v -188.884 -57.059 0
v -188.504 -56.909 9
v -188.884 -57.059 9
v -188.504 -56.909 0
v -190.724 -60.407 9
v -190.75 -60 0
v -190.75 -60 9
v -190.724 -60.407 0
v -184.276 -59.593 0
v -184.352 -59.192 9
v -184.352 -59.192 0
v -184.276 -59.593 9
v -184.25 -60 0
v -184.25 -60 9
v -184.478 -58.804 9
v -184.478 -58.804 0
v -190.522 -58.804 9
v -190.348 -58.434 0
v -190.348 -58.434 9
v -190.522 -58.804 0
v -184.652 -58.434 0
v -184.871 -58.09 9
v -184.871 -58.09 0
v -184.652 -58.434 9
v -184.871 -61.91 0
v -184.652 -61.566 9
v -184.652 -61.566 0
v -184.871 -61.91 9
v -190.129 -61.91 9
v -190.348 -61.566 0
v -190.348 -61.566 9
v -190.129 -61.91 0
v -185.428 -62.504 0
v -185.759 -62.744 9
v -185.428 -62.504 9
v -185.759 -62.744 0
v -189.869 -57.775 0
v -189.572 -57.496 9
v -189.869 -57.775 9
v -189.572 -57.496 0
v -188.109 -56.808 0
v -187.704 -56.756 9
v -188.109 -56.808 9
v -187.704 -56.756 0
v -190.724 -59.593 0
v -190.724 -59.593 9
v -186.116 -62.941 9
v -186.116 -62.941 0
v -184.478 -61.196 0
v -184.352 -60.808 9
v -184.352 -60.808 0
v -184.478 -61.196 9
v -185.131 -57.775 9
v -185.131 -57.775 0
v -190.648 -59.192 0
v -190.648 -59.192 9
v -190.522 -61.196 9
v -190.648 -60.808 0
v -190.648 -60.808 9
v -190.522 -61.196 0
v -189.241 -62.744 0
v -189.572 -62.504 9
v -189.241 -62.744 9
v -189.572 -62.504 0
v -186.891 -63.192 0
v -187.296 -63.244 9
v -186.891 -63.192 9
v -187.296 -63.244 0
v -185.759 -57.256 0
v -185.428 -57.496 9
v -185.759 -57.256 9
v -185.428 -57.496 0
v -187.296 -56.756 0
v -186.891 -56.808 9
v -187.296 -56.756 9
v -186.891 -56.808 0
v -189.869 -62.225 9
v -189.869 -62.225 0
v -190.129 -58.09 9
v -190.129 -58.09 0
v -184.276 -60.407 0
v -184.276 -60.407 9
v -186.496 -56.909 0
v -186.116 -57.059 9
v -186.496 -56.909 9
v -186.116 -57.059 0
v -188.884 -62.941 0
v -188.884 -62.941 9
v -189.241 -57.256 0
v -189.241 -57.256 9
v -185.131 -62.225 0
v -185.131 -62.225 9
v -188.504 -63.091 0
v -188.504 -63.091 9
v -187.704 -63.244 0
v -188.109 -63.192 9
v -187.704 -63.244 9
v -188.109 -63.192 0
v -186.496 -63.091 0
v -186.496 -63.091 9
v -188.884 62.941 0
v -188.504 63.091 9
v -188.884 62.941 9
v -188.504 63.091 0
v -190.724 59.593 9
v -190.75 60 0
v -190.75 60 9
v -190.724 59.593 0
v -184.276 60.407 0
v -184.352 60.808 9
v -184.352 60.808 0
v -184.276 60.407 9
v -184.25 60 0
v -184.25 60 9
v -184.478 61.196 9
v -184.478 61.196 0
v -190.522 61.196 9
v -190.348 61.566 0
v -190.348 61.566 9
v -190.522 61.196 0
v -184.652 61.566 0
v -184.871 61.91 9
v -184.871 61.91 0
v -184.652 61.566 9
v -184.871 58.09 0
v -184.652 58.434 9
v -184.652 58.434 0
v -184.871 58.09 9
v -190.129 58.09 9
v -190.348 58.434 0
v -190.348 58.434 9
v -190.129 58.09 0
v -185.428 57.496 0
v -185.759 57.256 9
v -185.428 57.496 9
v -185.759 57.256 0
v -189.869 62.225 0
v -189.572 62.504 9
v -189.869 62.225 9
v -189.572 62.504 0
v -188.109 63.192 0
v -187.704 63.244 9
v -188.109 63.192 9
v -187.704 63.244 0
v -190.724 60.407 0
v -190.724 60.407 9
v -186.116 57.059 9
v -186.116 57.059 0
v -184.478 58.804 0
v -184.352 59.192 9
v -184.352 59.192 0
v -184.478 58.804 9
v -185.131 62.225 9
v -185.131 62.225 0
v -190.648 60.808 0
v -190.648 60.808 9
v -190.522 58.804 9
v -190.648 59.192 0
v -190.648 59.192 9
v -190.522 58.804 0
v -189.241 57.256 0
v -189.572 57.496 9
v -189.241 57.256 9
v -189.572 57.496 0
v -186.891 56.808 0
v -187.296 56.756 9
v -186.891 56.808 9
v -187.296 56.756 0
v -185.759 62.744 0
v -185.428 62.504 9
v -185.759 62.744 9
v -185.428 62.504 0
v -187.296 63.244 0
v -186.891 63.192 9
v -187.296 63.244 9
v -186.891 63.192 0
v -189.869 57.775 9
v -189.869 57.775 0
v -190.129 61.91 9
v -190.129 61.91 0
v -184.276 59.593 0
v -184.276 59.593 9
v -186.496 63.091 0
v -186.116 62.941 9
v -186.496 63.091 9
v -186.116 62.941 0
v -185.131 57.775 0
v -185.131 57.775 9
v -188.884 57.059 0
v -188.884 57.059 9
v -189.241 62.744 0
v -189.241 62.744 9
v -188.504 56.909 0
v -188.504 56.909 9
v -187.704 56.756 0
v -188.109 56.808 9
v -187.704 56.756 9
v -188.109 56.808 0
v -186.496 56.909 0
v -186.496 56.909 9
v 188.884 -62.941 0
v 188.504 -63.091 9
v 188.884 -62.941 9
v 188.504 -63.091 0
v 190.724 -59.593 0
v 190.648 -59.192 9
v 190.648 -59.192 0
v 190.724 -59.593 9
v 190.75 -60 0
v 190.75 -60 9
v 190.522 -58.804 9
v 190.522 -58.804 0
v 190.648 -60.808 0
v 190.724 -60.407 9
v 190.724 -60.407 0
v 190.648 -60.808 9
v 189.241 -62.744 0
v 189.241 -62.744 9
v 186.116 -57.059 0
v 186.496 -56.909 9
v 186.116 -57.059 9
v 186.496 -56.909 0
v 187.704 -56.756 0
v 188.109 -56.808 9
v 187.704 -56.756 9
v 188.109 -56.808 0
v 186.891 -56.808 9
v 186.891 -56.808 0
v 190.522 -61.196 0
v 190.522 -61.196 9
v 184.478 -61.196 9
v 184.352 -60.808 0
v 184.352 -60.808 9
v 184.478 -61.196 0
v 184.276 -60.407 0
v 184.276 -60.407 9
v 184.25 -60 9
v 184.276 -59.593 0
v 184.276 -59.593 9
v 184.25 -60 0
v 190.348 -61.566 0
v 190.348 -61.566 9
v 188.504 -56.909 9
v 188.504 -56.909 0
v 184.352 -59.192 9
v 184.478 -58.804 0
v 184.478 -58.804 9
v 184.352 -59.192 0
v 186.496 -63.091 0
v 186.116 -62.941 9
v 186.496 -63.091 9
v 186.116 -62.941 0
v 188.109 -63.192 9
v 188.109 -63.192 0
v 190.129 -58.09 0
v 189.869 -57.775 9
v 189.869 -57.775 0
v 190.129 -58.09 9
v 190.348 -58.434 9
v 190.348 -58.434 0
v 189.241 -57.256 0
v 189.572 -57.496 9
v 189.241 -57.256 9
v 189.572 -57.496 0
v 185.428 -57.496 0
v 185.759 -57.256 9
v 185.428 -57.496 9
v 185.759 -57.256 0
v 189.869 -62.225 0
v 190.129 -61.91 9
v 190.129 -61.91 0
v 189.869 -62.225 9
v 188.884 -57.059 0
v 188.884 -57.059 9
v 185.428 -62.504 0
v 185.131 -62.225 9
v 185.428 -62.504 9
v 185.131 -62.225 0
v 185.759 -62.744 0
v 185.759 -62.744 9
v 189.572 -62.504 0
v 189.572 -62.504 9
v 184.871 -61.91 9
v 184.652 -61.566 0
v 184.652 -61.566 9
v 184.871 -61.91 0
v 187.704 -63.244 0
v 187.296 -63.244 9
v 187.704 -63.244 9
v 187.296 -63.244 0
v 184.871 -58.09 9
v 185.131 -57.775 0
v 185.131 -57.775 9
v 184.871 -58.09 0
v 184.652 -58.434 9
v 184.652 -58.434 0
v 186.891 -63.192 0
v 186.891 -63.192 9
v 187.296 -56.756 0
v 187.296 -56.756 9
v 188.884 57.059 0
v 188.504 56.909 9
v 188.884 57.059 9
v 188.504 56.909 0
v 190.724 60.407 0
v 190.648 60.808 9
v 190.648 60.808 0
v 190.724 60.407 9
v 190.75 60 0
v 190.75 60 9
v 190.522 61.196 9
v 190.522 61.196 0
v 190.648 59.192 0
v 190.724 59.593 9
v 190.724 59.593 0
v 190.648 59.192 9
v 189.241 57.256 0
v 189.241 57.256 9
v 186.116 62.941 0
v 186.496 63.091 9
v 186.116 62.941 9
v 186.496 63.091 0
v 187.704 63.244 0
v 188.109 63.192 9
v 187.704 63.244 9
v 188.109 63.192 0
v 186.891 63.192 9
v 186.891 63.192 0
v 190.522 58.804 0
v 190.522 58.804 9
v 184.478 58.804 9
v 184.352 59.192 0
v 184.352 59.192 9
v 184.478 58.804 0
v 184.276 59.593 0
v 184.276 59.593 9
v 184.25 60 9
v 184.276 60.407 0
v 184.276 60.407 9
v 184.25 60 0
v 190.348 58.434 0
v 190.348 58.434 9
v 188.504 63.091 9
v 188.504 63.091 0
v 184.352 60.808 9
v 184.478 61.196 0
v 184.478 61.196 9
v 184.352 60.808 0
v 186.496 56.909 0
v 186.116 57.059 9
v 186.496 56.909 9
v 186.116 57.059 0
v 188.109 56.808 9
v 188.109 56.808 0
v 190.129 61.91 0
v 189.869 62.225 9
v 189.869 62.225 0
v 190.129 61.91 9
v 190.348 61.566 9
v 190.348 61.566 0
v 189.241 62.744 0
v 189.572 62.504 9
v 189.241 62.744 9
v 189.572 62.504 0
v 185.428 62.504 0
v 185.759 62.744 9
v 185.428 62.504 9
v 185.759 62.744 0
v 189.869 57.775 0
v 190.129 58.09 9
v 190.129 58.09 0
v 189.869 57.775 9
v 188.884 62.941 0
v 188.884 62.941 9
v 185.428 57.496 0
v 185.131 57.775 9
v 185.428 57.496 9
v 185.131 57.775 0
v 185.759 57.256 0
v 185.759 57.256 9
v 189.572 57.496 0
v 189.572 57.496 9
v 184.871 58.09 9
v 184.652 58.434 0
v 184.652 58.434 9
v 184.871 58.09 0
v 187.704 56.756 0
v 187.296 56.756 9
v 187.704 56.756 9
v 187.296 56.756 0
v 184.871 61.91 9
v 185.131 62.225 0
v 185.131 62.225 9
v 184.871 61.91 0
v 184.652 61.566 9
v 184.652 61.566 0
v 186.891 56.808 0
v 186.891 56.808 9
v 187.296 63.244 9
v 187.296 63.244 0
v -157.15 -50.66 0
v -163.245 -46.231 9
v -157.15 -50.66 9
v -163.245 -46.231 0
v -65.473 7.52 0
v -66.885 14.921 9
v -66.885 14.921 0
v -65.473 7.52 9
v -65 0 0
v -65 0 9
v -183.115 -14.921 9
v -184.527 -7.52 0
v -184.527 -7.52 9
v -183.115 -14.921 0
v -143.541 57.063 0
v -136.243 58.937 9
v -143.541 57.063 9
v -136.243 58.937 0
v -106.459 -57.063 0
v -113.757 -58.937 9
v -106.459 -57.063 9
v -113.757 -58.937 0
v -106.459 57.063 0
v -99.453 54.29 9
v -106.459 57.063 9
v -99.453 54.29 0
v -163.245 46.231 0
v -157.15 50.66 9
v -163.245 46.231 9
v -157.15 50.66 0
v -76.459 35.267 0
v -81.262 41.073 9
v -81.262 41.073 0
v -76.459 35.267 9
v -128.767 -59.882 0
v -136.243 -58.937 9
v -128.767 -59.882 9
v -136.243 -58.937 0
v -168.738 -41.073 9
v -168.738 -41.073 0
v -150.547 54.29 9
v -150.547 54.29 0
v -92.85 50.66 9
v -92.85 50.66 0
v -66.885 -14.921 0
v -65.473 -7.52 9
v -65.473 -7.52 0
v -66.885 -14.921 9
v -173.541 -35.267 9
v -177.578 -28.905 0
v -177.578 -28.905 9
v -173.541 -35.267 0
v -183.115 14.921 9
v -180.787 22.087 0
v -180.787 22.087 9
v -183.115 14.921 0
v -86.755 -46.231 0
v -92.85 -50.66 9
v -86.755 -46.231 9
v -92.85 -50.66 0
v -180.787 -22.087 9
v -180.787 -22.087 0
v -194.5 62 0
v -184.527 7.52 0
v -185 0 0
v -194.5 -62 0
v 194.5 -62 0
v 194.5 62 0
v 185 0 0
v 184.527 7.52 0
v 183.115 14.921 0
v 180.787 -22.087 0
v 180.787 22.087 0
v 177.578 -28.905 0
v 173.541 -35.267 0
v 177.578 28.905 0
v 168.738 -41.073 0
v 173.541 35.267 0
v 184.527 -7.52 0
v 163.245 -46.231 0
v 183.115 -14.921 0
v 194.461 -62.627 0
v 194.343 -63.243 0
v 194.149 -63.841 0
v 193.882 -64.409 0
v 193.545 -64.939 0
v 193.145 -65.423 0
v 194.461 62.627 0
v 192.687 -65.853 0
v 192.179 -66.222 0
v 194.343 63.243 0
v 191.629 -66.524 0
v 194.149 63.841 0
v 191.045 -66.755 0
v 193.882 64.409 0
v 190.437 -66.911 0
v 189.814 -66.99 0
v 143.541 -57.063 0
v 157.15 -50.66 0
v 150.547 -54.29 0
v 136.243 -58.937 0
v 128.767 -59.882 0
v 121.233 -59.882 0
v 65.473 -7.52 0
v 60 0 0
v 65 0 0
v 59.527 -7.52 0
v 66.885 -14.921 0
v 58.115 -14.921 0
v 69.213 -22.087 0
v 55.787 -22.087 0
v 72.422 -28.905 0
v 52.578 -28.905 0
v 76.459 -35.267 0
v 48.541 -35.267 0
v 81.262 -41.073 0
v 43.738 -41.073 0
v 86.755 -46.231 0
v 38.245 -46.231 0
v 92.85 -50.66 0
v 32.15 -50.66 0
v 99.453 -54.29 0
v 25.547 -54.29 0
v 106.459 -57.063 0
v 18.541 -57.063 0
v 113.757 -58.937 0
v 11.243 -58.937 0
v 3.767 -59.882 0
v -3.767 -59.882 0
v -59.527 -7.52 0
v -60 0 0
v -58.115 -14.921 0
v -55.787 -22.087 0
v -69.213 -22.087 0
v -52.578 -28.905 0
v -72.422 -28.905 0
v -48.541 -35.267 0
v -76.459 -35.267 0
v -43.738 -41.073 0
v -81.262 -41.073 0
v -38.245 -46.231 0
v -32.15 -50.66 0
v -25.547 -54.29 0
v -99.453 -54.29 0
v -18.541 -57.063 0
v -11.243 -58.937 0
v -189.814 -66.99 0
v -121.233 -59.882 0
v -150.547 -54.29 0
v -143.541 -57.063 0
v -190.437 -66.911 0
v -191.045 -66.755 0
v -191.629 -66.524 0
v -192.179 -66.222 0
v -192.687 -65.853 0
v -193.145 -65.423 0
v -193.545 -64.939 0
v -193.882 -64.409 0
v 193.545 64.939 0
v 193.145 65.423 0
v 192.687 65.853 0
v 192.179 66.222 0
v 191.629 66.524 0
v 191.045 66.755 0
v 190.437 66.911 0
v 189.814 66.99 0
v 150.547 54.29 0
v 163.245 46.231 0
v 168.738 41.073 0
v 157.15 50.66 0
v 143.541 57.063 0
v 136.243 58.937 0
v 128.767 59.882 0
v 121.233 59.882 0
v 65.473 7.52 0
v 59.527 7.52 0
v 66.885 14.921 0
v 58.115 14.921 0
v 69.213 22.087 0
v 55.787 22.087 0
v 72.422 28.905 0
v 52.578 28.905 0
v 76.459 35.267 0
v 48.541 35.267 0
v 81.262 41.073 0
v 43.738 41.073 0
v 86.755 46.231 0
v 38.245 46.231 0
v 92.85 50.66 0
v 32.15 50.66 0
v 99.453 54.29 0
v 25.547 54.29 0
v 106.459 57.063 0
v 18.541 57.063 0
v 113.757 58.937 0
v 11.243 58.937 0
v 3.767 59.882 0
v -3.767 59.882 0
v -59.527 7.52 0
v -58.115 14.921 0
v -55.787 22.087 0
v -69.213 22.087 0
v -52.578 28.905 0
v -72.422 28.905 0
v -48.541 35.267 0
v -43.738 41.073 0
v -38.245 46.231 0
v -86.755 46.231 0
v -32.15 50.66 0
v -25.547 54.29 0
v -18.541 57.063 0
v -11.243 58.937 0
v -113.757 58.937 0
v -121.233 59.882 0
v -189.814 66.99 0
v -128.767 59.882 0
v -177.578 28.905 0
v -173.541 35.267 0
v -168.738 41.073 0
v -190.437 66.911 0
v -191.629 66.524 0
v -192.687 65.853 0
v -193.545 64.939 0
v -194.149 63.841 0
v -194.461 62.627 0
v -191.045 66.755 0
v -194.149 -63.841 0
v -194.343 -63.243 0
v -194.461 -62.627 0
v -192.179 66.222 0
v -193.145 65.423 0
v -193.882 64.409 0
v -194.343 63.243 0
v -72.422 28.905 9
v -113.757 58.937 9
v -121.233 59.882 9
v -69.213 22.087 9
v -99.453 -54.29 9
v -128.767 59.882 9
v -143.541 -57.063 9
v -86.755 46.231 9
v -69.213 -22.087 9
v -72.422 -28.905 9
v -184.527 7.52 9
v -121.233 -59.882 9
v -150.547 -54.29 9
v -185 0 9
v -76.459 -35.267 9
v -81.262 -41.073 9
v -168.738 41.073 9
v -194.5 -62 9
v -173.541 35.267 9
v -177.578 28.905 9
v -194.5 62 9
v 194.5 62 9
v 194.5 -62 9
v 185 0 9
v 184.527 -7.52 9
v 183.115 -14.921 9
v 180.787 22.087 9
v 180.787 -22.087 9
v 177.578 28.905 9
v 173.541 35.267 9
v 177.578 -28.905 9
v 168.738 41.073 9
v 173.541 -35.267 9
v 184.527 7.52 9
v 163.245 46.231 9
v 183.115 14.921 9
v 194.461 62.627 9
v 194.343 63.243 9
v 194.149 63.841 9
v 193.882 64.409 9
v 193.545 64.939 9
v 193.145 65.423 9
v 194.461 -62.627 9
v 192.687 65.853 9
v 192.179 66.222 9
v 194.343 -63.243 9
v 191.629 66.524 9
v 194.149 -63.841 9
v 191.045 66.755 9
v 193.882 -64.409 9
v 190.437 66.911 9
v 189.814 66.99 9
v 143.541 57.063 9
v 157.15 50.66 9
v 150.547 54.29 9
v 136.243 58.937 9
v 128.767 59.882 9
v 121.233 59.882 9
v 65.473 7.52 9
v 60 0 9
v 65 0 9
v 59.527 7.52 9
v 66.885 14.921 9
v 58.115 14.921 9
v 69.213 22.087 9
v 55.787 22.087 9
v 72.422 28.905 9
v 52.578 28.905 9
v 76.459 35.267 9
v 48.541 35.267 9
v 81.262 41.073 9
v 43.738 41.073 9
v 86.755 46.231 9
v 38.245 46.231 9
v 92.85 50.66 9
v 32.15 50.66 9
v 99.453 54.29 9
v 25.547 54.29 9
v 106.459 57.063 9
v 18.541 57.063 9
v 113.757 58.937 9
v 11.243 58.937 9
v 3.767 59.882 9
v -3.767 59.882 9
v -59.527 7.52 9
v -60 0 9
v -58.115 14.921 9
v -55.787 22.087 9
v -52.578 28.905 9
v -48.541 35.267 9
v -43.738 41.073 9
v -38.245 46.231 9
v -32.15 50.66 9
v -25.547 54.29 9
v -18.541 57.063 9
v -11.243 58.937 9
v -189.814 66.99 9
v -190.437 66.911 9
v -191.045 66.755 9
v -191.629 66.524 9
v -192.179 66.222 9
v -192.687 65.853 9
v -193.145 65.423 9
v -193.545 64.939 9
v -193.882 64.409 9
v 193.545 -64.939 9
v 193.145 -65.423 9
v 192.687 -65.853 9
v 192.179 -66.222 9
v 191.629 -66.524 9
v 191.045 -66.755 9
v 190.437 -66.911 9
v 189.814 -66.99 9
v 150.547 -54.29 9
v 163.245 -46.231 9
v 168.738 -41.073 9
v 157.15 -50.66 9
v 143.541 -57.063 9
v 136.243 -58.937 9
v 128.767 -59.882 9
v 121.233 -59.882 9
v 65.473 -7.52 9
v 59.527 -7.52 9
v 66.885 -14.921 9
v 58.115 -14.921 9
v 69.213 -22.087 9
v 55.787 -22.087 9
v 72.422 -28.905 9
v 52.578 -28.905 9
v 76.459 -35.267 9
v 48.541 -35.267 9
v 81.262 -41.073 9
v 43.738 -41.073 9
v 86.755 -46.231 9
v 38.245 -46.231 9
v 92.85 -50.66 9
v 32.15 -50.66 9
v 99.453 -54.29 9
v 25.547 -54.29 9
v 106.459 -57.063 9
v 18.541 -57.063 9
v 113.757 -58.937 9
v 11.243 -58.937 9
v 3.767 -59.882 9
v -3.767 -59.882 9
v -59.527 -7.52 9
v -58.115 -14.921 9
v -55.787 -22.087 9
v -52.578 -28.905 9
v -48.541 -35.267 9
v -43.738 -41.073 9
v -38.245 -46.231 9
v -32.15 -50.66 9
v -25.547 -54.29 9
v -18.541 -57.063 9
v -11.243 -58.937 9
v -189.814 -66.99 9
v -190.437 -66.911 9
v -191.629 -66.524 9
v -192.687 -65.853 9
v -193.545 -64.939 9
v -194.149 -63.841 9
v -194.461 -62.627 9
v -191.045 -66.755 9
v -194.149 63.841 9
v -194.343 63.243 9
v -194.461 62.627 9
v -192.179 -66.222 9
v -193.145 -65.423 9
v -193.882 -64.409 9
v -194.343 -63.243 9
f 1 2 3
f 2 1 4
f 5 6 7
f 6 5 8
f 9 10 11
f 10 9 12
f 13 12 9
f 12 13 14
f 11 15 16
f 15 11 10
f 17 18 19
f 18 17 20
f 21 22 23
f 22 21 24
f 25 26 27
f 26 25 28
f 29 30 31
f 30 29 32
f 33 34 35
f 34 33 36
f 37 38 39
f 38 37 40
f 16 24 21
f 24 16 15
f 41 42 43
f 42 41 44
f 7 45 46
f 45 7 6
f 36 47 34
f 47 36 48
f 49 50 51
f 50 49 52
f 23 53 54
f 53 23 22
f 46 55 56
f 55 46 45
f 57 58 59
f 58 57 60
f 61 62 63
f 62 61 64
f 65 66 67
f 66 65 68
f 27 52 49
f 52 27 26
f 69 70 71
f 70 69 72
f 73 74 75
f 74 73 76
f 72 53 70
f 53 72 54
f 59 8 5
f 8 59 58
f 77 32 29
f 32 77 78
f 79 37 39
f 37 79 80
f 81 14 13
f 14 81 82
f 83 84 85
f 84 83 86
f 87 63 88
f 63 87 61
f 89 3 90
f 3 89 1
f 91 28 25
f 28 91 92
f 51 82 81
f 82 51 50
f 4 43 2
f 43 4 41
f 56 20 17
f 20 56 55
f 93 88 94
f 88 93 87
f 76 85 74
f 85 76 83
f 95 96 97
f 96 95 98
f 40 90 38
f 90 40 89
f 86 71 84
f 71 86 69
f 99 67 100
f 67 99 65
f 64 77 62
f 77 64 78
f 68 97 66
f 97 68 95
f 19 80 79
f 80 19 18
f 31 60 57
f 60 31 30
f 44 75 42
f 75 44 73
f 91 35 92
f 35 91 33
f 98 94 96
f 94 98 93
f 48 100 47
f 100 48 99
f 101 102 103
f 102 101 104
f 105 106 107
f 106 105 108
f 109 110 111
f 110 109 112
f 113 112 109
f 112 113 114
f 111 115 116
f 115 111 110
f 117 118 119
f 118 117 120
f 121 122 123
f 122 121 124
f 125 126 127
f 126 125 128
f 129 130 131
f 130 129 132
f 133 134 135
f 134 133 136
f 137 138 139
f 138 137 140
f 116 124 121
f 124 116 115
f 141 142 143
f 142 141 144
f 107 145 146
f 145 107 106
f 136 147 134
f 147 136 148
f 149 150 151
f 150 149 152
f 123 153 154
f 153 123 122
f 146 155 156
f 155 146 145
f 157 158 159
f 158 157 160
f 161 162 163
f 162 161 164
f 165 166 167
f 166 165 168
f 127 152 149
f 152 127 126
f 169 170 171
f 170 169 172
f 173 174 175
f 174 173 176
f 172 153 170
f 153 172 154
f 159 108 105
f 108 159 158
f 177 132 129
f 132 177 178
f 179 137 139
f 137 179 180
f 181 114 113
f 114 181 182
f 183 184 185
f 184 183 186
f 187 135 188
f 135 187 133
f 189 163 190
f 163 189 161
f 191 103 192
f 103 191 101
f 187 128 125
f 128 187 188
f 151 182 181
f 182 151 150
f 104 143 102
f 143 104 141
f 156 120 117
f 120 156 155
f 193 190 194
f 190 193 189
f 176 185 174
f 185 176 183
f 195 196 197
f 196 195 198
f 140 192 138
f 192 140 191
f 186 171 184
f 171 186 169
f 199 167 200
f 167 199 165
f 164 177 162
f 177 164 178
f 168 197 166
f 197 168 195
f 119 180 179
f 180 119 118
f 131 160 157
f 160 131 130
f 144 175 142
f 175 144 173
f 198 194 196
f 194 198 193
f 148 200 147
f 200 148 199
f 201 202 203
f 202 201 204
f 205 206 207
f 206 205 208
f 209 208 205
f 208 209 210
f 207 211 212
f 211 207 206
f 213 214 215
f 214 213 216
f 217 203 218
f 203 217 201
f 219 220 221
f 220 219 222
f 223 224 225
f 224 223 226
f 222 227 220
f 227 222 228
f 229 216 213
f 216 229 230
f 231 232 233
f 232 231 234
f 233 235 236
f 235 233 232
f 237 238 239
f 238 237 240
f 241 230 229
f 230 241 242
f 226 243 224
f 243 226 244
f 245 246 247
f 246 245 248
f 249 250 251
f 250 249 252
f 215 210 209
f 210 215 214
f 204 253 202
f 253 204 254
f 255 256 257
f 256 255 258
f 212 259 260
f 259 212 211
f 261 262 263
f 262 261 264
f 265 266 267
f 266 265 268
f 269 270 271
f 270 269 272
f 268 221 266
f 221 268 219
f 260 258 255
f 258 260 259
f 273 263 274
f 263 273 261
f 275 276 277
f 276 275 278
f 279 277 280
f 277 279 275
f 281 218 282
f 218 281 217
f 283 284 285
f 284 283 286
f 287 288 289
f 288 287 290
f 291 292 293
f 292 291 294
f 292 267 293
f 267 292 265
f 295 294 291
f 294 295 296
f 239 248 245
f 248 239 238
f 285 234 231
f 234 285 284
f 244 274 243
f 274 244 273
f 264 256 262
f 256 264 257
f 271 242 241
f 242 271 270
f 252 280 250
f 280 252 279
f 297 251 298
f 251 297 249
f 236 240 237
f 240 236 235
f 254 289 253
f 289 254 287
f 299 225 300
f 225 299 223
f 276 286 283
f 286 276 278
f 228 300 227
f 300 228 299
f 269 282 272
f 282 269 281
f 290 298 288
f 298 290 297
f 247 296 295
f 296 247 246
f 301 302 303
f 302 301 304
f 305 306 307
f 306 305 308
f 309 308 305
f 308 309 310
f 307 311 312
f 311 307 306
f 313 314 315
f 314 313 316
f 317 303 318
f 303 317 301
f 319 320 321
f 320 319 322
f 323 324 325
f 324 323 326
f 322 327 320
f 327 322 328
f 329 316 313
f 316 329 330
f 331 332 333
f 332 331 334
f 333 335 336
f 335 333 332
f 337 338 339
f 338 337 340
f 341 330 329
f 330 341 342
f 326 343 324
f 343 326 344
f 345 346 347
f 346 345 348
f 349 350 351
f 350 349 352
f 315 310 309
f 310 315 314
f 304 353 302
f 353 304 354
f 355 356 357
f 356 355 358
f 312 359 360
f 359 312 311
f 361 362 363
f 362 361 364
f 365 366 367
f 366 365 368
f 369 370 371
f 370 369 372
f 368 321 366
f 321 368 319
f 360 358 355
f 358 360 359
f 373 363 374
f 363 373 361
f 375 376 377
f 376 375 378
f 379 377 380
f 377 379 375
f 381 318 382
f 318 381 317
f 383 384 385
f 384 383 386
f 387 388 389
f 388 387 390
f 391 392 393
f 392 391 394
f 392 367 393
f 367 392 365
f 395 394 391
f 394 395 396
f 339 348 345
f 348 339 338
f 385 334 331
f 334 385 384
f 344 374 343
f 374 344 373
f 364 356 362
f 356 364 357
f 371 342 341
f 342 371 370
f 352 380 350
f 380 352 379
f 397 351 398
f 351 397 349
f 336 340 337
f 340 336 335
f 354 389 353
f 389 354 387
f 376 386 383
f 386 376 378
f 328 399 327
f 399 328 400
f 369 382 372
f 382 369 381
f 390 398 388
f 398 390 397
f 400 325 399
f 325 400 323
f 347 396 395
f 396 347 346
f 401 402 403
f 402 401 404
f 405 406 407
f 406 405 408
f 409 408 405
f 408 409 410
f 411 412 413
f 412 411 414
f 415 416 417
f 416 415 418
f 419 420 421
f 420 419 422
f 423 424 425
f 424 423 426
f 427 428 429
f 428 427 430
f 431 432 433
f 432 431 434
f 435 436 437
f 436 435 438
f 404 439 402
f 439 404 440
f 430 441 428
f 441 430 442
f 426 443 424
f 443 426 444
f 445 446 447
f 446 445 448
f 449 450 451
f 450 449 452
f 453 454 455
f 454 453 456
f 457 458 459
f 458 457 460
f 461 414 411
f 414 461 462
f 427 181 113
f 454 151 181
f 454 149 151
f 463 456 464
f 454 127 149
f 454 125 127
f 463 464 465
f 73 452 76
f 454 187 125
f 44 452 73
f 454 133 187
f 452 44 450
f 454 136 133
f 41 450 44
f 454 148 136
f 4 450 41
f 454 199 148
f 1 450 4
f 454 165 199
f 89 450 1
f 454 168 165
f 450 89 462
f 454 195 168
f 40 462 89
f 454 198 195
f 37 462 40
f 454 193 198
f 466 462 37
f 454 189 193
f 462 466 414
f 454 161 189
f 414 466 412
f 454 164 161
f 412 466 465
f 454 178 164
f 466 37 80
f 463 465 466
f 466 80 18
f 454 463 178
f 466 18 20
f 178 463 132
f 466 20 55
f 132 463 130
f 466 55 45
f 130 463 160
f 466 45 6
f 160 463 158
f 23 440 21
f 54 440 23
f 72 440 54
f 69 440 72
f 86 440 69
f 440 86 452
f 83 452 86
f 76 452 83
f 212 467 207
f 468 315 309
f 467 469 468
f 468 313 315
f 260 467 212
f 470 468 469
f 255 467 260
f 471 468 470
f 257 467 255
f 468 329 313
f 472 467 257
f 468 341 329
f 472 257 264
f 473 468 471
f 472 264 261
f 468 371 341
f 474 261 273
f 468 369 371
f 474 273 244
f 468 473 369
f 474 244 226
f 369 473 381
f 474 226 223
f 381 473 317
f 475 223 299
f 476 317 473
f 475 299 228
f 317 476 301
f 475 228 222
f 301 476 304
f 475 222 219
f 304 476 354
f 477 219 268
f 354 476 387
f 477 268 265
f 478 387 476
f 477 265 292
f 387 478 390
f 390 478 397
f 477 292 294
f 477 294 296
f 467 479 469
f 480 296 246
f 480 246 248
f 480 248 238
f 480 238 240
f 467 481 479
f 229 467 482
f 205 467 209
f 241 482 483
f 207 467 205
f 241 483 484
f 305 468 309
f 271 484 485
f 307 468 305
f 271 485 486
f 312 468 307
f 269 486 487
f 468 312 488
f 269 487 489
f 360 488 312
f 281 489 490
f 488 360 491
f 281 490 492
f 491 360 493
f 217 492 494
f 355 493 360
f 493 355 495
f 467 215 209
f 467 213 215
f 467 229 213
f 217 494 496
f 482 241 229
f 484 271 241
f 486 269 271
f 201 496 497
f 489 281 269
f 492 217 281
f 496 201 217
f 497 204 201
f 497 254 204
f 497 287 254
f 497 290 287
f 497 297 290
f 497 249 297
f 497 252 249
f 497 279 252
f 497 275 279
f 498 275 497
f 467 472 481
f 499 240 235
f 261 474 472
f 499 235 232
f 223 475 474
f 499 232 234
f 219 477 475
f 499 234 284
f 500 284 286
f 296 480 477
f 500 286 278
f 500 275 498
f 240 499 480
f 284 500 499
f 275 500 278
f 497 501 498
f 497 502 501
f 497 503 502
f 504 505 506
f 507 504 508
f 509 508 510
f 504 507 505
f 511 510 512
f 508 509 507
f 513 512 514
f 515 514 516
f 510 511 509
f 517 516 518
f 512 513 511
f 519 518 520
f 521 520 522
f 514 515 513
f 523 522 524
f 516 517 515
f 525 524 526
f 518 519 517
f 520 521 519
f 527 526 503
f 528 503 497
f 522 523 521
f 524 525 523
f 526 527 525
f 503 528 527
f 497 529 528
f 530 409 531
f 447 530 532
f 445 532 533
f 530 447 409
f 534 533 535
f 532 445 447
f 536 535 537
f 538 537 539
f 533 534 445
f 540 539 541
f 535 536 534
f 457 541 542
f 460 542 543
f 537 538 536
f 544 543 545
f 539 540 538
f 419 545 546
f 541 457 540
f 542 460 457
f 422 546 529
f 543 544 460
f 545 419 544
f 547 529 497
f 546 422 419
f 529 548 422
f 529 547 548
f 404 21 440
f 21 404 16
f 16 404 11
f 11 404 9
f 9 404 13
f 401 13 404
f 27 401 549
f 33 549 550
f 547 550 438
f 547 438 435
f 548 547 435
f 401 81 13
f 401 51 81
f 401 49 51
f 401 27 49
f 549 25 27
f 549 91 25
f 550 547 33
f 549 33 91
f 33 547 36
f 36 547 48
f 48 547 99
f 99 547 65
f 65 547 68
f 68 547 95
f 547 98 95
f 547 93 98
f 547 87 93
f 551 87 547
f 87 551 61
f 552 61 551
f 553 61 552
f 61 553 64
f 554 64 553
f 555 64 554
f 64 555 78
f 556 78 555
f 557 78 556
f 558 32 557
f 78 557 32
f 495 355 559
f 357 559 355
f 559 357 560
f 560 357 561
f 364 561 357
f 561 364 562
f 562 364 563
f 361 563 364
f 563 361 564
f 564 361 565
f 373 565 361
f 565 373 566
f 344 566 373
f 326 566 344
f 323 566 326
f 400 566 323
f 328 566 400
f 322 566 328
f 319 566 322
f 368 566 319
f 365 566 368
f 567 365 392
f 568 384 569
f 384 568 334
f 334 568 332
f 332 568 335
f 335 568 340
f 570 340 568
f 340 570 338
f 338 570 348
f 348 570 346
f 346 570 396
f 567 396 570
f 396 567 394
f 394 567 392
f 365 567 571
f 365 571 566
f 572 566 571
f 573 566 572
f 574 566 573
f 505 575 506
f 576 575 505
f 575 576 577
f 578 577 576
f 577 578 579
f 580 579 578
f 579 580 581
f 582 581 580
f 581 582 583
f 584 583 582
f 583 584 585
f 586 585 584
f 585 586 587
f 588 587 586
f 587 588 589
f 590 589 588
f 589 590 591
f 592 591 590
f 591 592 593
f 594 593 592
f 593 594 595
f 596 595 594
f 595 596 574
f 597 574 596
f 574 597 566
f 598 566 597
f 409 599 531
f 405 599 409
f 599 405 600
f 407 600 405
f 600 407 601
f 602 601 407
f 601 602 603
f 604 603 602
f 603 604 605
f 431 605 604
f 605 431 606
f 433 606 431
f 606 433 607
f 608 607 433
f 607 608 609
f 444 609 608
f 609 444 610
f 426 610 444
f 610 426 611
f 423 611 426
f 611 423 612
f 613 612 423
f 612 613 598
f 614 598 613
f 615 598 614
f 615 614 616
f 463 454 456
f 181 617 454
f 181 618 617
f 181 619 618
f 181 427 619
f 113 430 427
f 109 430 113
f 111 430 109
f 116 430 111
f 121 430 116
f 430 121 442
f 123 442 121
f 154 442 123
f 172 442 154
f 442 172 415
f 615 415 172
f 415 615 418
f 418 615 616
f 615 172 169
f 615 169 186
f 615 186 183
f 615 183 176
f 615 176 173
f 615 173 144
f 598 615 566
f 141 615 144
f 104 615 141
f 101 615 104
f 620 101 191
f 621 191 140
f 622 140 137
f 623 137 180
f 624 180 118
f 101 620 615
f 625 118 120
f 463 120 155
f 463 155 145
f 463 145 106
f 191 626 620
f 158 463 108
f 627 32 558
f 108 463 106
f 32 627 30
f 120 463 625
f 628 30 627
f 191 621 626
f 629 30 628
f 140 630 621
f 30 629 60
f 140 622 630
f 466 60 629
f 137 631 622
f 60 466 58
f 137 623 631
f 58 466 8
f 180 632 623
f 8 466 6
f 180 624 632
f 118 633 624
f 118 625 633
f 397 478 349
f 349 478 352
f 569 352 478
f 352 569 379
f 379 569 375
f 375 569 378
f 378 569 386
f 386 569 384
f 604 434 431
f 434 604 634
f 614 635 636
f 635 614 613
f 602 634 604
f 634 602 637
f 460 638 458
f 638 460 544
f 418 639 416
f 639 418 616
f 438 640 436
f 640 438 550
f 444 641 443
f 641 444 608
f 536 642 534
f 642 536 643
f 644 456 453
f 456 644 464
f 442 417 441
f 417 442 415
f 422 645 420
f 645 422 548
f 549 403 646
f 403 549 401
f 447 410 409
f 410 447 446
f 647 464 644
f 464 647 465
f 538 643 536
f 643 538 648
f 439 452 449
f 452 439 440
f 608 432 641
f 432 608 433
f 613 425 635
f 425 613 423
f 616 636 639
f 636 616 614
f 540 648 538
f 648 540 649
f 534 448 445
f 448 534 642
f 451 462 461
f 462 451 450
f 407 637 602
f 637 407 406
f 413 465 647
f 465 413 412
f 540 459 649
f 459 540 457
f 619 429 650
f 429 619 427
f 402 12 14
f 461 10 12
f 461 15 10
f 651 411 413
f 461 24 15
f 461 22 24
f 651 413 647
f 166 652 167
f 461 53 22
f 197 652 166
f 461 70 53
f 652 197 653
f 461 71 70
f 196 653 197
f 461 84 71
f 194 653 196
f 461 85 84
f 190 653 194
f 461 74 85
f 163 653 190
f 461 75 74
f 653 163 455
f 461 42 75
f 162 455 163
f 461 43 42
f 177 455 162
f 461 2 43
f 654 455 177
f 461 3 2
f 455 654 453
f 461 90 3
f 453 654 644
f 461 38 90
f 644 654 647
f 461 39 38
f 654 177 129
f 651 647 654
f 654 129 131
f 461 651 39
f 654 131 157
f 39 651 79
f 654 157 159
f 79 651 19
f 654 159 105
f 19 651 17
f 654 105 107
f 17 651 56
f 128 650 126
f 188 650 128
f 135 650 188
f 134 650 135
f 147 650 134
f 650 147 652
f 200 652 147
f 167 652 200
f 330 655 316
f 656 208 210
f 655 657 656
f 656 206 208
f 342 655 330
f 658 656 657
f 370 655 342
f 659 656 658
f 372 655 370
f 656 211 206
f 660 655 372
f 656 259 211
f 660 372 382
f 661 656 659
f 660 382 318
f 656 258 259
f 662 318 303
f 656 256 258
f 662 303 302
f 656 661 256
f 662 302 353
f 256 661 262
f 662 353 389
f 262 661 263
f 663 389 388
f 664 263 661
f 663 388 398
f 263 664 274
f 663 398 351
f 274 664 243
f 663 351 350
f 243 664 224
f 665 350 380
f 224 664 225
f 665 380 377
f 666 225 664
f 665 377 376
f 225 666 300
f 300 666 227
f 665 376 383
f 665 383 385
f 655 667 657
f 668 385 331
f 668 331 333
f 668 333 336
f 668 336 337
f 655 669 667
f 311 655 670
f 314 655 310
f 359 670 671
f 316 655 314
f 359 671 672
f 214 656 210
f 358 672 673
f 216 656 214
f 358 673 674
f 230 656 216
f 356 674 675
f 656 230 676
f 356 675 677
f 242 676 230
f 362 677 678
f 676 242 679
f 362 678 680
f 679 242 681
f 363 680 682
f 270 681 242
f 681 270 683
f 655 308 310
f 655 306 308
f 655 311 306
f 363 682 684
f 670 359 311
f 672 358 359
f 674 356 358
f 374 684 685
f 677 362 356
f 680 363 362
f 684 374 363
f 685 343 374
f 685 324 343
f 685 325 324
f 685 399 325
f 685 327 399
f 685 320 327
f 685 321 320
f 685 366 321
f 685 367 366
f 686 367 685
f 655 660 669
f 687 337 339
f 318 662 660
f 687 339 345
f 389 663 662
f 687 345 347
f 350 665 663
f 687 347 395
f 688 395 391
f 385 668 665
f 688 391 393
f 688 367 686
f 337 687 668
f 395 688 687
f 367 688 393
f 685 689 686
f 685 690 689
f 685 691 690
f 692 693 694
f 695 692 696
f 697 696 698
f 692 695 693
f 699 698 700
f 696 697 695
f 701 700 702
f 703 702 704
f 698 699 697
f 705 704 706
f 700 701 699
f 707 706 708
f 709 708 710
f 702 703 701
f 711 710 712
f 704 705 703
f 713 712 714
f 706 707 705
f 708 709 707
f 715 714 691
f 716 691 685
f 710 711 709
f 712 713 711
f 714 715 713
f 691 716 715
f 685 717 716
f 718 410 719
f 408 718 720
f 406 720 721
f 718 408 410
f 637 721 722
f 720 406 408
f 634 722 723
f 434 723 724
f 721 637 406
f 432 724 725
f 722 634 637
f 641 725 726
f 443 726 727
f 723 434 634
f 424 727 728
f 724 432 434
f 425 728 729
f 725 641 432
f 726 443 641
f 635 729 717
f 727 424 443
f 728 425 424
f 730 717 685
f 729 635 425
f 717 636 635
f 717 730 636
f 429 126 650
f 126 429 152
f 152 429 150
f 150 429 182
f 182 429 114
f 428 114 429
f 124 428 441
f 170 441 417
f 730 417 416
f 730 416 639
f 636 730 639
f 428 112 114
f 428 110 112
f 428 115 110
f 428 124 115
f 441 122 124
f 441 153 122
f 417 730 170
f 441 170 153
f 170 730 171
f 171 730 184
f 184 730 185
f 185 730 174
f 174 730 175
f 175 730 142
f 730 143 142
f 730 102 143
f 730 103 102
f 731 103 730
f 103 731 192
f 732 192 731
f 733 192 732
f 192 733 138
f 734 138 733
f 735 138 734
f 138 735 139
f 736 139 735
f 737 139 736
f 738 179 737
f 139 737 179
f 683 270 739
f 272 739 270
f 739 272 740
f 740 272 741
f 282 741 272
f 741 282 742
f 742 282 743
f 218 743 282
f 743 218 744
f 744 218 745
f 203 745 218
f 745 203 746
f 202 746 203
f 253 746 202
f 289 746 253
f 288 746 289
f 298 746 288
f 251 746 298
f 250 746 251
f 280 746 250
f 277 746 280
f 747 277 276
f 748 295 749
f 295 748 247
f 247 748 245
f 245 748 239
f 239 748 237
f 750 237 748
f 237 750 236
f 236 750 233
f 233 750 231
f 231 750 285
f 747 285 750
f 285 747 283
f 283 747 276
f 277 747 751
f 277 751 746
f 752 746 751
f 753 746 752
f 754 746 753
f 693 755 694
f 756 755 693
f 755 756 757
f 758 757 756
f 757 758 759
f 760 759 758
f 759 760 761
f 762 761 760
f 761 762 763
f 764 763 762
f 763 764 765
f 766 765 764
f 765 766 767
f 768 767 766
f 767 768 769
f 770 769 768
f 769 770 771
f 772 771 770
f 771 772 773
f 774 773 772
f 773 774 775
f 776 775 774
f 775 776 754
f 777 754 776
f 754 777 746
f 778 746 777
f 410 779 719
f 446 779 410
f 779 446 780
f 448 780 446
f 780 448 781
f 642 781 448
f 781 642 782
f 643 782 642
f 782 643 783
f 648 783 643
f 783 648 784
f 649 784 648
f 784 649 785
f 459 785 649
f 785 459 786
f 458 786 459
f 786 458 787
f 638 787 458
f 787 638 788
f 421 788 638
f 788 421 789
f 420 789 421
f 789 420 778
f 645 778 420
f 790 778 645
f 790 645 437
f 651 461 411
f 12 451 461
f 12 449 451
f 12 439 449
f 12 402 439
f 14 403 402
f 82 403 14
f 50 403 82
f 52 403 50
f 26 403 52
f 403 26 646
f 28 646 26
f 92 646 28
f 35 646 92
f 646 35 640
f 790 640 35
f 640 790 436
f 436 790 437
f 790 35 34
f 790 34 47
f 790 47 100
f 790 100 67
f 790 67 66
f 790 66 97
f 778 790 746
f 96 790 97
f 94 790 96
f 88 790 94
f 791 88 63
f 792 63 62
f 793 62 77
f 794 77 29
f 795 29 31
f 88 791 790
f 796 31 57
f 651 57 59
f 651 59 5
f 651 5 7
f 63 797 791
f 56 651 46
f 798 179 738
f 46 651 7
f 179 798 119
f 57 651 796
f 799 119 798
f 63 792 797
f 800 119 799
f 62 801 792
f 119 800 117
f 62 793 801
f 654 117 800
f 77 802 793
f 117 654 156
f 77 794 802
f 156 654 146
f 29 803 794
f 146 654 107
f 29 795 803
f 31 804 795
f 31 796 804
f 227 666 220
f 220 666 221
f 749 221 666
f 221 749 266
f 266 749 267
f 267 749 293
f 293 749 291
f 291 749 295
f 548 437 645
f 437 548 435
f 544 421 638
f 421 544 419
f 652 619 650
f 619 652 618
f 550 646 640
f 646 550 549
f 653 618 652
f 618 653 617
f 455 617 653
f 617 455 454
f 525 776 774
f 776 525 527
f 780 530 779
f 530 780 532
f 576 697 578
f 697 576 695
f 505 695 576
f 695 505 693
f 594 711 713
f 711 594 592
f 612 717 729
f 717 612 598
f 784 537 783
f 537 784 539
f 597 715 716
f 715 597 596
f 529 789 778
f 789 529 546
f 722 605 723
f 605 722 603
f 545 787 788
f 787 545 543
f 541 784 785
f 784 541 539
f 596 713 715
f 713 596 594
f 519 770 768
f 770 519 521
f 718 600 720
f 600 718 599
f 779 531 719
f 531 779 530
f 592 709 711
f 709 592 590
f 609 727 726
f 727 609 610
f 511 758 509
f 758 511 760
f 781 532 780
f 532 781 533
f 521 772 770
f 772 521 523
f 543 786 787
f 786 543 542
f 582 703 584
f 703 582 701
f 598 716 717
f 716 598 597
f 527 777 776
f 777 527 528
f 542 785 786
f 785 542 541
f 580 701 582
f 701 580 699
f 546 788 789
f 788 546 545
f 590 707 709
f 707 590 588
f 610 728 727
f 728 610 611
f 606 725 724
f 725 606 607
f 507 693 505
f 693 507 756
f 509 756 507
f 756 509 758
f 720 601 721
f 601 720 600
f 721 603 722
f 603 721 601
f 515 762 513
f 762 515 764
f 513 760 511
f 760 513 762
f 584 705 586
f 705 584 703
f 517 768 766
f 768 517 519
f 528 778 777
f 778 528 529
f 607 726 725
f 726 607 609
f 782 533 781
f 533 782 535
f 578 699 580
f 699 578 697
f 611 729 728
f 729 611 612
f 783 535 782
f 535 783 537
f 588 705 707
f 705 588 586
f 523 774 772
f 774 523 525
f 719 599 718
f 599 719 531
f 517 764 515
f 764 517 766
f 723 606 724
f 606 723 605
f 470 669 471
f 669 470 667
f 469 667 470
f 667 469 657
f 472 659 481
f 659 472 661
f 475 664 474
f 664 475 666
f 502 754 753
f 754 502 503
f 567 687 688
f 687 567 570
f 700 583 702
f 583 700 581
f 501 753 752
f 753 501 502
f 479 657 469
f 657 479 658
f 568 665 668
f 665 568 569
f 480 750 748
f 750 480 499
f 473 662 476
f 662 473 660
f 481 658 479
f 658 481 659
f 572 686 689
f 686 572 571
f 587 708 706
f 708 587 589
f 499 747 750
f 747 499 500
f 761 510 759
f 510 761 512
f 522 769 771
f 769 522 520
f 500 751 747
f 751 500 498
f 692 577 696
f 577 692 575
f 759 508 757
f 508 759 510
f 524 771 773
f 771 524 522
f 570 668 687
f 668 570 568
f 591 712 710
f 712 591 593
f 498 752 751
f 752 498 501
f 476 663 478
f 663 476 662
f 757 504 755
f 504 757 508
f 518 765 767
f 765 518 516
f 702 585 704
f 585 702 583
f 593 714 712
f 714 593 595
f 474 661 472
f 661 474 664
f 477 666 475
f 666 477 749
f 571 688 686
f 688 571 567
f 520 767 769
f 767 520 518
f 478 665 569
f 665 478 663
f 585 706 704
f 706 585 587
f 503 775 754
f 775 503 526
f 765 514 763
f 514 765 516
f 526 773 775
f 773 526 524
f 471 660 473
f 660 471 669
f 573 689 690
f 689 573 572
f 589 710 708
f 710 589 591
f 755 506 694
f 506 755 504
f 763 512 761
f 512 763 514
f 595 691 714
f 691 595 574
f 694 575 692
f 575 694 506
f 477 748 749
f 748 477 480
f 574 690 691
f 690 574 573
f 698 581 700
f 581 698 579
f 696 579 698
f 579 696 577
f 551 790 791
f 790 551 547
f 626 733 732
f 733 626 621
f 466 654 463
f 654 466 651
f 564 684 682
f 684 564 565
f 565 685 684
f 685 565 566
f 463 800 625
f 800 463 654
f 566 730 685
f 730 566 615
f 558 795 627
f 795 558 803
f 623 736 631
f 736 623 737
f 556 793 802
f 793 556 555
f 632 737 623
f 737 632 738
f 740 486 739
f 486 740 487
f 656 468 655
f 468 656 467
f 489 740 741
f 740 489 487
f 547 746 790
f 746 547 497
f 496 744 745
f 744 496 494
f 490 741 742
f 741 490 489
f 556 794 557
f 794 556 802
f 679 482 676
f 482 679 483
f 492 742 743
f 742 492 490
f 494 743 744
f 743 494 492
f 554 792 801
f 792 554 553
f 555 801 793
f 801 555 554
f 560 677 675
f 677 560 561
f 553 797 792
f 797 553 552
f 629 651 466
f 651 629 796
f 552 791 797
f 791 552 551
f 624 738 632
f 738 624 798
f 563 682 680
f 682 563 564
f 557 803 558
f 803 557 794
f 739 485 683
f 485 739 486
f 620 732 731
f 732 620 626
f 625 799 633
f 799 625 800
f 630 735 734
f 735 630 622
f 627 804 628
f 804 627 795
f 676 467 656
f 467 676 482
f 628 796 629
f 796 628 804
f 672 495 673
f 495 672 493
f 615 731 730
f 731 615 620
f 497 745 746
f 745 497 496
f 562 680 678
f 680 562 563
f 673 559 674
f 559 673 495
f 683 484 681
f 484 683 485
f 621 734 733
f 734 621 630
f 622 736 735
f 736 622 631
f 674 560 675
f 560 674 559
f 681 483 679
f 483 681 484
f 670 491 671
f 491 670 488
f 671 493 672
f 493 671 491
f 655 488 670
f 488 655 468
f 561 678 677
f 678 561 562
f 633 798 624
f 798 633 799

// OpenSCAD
$fn = 50;

difference() {
	union() {
		hull() {
			translate(v = [-189.5, 62.0, 0]) {
				cylinder(h = 9, r = 5);
			}
			translate(v = [189.5, 62.0, 0]) {
				cylinder(h = 9, r = 5);
			}
			translate(v = [-189.5, -62.0, 0]) {
				cylinder(h = 9, r = 5);
			}
			translate(v = [189.5, -62.0, 0]) {
				cylinder(h = 9, r = 5);
			}
		}
	}
	union() {
		translate(v = [-187.5, -60.0, -100.0]) {
			cylinder(h = 200, r = 3.25);
		}
		translate(v = [-187.5, 60.0, -100.0]) {
			cylinder(h = 200, r = 3.25);
		}
		translate(v = [187.5, -60.0, -100.0]) {
			cylinder(h = 200, r = 3.25);
		}
		translate(v = [187.5, 60.0, -100.0]) {
			cylinder(h = 200, r = 3.25);
		}
		translate(v = [-187.5, -60.0, -100.0]) {
			cylinder(h = 200, r = 1.8);
		}
		translate(v = [-187.5, 60.0, -100.0]) {
			cylinder(h = 200, r = 1.8);
		}
		translate(v = [187.5, -60.0, -100.0]) {
			cylinder(h = 200, r = 1.8);
		}
		translate(v = [187.5, 60.0, -100.0]) {
			cylinder(h = 200, r = 1.8);
		}
		translate(v = [-125.0, 0, 0.0]) {
			cylinder(h = 9, r = 60.0);
		}
		cylinder(h = 9, r = 60.0);
		translate(v = [125.0, 0, 0.0]) {
			cylinder(h = 9, r = 60.0);
		}
	}
}
